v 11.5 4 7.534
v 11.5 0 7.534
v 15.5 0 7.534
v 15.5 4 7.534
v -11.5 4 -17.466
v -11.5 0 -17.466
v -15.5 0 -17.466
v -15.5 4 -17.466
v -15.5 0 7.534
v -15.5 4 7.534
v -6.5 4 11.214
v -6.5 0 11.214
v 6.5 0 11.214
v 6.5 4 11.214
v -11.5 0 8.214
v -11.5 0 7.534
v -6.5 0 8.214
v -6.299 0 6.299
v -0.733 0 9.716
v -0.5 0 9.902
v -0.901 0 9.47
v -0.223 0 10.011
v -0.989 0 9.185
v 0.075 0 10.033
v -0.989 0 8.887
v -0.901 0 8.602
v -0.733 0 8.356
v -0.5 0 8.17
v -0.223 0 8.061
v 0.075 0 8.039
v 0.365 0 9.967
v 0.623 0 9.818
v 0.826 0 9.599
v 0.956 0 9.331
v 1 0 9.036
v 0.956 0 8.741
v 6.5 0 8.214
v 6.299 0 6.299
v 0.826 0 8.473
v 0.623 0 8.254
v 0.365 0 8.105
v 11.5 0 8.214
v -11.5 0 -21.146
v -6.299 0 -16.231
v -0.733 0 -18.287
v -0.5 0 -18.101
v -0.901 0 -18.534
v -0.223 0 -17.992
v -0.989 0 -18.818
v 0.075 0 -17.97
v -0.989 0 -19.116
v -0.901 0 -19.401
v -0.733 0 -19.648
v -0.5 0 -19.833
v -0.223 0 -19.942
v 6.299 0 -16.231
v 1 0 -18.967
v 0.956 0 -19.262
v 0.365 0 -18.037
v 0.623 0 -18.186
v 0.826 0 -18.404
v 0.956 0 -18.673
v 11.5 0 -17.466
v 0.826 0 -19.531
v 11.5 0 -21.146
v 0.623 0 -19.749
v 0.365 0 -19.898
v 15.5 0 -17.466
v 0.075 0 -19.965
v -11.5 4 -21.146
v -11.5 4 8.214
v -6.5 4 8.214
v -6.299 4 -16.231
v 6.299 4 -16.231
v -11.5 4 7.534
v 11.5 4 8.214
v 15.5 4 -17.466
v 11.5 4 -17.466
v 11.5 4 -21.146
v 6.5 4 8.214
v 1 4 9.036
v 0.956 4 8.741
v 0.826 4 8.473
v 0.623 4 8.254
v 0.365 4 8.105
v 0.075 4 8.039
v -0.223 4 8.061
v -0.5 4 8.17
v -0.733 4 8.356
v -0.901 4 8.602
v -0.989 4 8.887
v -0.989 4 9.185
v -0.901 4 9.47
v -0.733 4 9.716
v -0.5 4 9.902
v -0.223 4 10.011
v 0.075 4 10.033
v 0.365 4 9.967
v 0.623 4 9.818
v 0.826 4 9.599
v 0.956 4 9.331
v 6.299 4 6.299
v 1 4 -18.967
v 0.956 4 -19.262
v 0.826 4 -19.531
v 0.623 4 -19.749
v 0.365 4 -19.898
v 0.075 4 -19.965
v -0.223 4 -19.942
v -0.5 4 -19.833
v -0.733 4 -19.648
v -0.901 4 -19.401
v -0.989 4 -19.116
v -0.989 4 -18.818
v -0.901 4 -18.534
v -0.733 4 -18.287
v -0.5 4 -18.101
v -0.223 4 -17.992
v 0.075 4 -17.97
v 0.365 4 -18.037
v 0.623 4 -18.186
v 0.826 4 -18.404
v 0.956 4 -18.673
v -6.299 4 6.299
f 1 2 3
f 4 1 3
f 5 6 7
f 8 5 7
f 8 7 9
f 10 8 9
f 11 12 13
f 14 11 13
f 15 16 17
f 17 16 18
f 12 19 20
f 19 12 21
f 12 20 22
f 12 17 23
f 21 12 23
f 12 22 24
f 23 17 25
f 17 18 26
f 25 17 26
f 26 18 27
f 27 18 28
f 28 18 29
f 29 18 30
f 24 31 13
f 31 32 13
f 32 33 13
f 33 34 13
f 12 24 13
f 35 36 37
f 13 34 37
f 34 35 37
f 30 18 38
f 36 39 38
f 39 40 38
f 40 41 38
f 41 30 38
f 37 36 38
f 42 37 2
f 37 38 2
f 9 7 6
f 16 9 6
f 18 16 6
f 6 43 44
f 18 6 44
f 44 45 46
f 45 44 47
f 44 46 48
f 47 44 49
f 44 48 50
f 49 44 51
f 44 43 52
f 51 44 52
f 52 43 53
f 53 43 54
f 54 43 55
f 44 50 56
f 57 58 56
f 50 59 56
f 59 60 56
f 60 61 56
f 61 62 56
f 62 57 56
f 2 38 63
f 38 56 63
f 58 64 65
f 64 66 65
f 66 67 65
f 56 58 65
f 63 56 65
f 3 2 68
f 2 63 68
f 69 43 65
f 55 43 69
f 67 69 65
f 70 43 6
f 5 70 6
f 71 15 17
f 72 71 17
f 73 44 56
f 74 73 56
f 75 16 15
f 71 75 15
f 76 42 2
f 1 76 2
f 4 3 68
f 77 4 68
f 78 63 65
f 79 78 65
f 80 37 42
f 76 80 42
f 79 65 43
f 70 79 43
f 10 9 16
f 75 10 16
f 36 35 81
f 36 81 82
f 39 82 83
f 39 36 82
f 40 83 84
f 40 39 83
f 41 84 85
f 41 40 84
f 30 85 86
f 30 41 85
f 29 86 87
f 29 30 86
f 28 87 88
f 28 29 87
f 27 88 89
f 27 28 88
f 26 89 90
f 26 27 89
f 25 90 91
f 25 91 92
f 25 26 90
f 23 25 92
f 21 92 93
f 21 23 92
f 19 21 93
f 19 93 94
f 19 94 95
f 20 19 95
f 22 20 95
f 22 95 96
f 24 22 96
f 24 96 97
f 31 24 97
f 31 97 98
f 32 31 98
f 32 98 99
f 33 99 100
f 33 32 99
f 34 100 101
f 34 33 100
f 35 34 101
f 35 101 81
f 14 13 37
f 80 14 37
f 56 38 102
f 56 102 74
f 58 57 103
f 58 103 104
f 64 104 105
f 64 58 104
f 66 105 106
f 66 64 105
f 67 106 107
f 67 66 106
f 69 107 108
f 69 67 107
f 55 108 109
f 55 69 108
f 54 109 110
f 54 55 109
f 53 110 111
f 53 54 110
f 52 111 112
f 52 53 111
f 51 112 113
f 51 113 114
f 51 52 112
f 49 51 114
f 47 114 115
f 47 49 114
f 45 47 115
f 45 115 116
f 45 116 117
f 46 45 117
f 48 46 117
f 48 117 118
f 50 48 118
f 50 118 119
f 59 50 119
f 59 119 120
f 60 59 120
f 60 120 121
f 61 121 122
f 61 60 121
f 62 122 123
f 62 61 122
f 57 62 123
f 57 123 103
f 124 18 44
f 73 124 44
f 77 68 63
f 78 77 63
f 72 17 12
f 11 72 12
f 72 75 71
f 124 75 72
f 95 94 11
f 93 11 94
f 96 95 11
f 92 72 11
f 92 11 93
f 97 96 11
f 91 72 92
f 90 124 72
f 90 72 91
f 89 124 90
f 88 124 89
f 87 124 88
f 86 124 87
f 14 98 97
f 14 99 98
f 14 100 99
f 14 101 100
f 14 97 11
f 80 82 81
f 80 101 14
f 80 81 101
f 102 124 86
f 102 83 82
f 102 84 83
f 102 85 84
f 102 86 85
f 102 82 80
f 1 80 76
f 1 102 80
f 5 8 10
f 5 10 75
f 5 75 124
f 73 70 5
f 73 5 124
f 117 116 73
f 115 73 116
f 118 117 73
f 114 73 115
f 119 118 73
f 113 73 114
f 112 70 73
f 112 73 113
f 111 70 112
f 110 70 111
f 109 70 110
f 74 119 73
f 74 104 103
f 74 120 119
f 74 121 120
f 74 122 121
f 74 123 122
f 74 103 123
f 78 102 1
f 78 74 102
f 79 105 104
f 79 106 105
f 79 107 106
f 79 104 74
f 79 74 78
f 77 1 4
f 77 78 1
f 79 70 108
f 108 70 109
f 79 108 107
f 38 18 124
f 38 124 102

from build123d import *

# Parameters (mm, degrees)
CROQUIS1_R              = 1
CROQUIS1_W              = 12.5984
CROQUIS1_H              = 22.5298
SALIENTE_EXTRUIR1_DEPTH = 4


with BuildPart() as part:
    # Croquis1 → Saliente-Extruir1 (new body)
    with BuildSketch(Plane(origin=(0, 0, 0), x_dir=(1, 0, 0), z_dir=(0, 1, 0))):
        Polygon((-6.5, -11.2141), (-6.2992, -11.2141), (6.5, -11.2141), (6.5, -8.2141), (11.5, -8.2141), (11.5, -7.5343), (15.5, -7.5343), (15.5, 17.4657), (11.5, 17.4657), (11.5, 21.1455), (-11.5, 21.1455), (-11.5, 17.4657), (-15.5, 17.4657), (-15.5, -7.5343), (-11.5, -7.5343), (-11.5, -8.2141), (-6.5, -8.2141), align=None)
        with Locations((0, -9.036)):
            Circle(CROQUIS1_R, mode=Mode.SUBTRACT)
        with Locations((0, 4.9657)):
            Rectangle(CROQUIS1_W, CROQUIS1_H, mode=Mode.SUBTRACT)
        with Locations((0, 18.9674)):
            Circle(CROQUIS1_R, mode=Mode.SUBTRACT)
    extrude(amount=SALIENTE_EXTRUIR1_DEPTH)


solid = part.part
